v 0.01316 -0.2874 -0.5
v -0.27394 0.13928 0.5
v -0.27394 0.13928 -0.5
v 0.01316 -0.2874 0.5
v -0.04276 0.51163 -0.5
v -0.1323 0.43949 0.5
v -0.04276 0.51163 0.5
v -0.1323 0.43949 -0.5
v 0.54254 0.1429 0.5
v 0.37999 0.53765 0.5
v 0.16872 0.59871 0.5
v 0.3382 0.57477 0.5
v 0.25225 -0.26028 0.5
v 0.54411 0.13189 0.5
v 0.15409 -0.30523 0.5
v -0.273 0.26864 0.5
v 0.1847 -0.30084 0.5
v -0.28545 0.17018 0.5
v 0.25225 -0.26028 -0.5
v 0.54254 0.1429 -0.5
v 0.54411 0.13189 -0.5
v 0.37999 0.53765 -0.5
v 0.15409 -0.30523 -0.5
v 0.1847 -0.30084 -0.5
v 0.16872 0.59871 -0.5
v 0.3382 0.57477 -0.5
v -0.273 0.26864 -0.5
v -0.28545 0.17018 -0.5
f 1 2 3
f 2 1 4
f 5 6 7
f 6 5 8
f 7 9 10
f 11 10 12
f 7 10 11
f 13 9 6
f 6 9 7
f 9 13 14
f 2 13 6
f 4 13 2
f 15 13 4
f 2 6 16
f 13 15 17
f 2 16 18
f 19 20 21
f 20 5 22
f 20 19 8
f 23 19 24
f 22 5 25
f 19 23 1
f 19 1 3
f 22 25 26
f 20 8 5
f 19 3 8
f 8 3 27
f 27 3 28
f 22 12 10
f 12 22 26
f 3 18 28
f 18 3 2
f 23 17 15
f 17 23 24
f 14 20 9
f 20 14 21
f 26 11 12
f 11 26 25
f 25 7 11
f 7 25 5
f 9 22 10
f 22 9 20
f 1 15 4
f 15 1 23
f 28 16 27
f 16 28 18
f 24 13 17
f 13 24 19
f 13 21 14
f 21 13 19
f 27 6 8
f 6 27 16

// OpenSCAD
seed = 0;
n = 20;
alphas = rands(0,360.0,n,seed);
off_x = rands(0,0.3,n);
off_y = rands(0,0.3,n);
   intersection_for(i=[0:n-1])
      translate([off_x[i], off_y[i], 0.0])
         rotate(alphas[i])
            cube(center=true);
